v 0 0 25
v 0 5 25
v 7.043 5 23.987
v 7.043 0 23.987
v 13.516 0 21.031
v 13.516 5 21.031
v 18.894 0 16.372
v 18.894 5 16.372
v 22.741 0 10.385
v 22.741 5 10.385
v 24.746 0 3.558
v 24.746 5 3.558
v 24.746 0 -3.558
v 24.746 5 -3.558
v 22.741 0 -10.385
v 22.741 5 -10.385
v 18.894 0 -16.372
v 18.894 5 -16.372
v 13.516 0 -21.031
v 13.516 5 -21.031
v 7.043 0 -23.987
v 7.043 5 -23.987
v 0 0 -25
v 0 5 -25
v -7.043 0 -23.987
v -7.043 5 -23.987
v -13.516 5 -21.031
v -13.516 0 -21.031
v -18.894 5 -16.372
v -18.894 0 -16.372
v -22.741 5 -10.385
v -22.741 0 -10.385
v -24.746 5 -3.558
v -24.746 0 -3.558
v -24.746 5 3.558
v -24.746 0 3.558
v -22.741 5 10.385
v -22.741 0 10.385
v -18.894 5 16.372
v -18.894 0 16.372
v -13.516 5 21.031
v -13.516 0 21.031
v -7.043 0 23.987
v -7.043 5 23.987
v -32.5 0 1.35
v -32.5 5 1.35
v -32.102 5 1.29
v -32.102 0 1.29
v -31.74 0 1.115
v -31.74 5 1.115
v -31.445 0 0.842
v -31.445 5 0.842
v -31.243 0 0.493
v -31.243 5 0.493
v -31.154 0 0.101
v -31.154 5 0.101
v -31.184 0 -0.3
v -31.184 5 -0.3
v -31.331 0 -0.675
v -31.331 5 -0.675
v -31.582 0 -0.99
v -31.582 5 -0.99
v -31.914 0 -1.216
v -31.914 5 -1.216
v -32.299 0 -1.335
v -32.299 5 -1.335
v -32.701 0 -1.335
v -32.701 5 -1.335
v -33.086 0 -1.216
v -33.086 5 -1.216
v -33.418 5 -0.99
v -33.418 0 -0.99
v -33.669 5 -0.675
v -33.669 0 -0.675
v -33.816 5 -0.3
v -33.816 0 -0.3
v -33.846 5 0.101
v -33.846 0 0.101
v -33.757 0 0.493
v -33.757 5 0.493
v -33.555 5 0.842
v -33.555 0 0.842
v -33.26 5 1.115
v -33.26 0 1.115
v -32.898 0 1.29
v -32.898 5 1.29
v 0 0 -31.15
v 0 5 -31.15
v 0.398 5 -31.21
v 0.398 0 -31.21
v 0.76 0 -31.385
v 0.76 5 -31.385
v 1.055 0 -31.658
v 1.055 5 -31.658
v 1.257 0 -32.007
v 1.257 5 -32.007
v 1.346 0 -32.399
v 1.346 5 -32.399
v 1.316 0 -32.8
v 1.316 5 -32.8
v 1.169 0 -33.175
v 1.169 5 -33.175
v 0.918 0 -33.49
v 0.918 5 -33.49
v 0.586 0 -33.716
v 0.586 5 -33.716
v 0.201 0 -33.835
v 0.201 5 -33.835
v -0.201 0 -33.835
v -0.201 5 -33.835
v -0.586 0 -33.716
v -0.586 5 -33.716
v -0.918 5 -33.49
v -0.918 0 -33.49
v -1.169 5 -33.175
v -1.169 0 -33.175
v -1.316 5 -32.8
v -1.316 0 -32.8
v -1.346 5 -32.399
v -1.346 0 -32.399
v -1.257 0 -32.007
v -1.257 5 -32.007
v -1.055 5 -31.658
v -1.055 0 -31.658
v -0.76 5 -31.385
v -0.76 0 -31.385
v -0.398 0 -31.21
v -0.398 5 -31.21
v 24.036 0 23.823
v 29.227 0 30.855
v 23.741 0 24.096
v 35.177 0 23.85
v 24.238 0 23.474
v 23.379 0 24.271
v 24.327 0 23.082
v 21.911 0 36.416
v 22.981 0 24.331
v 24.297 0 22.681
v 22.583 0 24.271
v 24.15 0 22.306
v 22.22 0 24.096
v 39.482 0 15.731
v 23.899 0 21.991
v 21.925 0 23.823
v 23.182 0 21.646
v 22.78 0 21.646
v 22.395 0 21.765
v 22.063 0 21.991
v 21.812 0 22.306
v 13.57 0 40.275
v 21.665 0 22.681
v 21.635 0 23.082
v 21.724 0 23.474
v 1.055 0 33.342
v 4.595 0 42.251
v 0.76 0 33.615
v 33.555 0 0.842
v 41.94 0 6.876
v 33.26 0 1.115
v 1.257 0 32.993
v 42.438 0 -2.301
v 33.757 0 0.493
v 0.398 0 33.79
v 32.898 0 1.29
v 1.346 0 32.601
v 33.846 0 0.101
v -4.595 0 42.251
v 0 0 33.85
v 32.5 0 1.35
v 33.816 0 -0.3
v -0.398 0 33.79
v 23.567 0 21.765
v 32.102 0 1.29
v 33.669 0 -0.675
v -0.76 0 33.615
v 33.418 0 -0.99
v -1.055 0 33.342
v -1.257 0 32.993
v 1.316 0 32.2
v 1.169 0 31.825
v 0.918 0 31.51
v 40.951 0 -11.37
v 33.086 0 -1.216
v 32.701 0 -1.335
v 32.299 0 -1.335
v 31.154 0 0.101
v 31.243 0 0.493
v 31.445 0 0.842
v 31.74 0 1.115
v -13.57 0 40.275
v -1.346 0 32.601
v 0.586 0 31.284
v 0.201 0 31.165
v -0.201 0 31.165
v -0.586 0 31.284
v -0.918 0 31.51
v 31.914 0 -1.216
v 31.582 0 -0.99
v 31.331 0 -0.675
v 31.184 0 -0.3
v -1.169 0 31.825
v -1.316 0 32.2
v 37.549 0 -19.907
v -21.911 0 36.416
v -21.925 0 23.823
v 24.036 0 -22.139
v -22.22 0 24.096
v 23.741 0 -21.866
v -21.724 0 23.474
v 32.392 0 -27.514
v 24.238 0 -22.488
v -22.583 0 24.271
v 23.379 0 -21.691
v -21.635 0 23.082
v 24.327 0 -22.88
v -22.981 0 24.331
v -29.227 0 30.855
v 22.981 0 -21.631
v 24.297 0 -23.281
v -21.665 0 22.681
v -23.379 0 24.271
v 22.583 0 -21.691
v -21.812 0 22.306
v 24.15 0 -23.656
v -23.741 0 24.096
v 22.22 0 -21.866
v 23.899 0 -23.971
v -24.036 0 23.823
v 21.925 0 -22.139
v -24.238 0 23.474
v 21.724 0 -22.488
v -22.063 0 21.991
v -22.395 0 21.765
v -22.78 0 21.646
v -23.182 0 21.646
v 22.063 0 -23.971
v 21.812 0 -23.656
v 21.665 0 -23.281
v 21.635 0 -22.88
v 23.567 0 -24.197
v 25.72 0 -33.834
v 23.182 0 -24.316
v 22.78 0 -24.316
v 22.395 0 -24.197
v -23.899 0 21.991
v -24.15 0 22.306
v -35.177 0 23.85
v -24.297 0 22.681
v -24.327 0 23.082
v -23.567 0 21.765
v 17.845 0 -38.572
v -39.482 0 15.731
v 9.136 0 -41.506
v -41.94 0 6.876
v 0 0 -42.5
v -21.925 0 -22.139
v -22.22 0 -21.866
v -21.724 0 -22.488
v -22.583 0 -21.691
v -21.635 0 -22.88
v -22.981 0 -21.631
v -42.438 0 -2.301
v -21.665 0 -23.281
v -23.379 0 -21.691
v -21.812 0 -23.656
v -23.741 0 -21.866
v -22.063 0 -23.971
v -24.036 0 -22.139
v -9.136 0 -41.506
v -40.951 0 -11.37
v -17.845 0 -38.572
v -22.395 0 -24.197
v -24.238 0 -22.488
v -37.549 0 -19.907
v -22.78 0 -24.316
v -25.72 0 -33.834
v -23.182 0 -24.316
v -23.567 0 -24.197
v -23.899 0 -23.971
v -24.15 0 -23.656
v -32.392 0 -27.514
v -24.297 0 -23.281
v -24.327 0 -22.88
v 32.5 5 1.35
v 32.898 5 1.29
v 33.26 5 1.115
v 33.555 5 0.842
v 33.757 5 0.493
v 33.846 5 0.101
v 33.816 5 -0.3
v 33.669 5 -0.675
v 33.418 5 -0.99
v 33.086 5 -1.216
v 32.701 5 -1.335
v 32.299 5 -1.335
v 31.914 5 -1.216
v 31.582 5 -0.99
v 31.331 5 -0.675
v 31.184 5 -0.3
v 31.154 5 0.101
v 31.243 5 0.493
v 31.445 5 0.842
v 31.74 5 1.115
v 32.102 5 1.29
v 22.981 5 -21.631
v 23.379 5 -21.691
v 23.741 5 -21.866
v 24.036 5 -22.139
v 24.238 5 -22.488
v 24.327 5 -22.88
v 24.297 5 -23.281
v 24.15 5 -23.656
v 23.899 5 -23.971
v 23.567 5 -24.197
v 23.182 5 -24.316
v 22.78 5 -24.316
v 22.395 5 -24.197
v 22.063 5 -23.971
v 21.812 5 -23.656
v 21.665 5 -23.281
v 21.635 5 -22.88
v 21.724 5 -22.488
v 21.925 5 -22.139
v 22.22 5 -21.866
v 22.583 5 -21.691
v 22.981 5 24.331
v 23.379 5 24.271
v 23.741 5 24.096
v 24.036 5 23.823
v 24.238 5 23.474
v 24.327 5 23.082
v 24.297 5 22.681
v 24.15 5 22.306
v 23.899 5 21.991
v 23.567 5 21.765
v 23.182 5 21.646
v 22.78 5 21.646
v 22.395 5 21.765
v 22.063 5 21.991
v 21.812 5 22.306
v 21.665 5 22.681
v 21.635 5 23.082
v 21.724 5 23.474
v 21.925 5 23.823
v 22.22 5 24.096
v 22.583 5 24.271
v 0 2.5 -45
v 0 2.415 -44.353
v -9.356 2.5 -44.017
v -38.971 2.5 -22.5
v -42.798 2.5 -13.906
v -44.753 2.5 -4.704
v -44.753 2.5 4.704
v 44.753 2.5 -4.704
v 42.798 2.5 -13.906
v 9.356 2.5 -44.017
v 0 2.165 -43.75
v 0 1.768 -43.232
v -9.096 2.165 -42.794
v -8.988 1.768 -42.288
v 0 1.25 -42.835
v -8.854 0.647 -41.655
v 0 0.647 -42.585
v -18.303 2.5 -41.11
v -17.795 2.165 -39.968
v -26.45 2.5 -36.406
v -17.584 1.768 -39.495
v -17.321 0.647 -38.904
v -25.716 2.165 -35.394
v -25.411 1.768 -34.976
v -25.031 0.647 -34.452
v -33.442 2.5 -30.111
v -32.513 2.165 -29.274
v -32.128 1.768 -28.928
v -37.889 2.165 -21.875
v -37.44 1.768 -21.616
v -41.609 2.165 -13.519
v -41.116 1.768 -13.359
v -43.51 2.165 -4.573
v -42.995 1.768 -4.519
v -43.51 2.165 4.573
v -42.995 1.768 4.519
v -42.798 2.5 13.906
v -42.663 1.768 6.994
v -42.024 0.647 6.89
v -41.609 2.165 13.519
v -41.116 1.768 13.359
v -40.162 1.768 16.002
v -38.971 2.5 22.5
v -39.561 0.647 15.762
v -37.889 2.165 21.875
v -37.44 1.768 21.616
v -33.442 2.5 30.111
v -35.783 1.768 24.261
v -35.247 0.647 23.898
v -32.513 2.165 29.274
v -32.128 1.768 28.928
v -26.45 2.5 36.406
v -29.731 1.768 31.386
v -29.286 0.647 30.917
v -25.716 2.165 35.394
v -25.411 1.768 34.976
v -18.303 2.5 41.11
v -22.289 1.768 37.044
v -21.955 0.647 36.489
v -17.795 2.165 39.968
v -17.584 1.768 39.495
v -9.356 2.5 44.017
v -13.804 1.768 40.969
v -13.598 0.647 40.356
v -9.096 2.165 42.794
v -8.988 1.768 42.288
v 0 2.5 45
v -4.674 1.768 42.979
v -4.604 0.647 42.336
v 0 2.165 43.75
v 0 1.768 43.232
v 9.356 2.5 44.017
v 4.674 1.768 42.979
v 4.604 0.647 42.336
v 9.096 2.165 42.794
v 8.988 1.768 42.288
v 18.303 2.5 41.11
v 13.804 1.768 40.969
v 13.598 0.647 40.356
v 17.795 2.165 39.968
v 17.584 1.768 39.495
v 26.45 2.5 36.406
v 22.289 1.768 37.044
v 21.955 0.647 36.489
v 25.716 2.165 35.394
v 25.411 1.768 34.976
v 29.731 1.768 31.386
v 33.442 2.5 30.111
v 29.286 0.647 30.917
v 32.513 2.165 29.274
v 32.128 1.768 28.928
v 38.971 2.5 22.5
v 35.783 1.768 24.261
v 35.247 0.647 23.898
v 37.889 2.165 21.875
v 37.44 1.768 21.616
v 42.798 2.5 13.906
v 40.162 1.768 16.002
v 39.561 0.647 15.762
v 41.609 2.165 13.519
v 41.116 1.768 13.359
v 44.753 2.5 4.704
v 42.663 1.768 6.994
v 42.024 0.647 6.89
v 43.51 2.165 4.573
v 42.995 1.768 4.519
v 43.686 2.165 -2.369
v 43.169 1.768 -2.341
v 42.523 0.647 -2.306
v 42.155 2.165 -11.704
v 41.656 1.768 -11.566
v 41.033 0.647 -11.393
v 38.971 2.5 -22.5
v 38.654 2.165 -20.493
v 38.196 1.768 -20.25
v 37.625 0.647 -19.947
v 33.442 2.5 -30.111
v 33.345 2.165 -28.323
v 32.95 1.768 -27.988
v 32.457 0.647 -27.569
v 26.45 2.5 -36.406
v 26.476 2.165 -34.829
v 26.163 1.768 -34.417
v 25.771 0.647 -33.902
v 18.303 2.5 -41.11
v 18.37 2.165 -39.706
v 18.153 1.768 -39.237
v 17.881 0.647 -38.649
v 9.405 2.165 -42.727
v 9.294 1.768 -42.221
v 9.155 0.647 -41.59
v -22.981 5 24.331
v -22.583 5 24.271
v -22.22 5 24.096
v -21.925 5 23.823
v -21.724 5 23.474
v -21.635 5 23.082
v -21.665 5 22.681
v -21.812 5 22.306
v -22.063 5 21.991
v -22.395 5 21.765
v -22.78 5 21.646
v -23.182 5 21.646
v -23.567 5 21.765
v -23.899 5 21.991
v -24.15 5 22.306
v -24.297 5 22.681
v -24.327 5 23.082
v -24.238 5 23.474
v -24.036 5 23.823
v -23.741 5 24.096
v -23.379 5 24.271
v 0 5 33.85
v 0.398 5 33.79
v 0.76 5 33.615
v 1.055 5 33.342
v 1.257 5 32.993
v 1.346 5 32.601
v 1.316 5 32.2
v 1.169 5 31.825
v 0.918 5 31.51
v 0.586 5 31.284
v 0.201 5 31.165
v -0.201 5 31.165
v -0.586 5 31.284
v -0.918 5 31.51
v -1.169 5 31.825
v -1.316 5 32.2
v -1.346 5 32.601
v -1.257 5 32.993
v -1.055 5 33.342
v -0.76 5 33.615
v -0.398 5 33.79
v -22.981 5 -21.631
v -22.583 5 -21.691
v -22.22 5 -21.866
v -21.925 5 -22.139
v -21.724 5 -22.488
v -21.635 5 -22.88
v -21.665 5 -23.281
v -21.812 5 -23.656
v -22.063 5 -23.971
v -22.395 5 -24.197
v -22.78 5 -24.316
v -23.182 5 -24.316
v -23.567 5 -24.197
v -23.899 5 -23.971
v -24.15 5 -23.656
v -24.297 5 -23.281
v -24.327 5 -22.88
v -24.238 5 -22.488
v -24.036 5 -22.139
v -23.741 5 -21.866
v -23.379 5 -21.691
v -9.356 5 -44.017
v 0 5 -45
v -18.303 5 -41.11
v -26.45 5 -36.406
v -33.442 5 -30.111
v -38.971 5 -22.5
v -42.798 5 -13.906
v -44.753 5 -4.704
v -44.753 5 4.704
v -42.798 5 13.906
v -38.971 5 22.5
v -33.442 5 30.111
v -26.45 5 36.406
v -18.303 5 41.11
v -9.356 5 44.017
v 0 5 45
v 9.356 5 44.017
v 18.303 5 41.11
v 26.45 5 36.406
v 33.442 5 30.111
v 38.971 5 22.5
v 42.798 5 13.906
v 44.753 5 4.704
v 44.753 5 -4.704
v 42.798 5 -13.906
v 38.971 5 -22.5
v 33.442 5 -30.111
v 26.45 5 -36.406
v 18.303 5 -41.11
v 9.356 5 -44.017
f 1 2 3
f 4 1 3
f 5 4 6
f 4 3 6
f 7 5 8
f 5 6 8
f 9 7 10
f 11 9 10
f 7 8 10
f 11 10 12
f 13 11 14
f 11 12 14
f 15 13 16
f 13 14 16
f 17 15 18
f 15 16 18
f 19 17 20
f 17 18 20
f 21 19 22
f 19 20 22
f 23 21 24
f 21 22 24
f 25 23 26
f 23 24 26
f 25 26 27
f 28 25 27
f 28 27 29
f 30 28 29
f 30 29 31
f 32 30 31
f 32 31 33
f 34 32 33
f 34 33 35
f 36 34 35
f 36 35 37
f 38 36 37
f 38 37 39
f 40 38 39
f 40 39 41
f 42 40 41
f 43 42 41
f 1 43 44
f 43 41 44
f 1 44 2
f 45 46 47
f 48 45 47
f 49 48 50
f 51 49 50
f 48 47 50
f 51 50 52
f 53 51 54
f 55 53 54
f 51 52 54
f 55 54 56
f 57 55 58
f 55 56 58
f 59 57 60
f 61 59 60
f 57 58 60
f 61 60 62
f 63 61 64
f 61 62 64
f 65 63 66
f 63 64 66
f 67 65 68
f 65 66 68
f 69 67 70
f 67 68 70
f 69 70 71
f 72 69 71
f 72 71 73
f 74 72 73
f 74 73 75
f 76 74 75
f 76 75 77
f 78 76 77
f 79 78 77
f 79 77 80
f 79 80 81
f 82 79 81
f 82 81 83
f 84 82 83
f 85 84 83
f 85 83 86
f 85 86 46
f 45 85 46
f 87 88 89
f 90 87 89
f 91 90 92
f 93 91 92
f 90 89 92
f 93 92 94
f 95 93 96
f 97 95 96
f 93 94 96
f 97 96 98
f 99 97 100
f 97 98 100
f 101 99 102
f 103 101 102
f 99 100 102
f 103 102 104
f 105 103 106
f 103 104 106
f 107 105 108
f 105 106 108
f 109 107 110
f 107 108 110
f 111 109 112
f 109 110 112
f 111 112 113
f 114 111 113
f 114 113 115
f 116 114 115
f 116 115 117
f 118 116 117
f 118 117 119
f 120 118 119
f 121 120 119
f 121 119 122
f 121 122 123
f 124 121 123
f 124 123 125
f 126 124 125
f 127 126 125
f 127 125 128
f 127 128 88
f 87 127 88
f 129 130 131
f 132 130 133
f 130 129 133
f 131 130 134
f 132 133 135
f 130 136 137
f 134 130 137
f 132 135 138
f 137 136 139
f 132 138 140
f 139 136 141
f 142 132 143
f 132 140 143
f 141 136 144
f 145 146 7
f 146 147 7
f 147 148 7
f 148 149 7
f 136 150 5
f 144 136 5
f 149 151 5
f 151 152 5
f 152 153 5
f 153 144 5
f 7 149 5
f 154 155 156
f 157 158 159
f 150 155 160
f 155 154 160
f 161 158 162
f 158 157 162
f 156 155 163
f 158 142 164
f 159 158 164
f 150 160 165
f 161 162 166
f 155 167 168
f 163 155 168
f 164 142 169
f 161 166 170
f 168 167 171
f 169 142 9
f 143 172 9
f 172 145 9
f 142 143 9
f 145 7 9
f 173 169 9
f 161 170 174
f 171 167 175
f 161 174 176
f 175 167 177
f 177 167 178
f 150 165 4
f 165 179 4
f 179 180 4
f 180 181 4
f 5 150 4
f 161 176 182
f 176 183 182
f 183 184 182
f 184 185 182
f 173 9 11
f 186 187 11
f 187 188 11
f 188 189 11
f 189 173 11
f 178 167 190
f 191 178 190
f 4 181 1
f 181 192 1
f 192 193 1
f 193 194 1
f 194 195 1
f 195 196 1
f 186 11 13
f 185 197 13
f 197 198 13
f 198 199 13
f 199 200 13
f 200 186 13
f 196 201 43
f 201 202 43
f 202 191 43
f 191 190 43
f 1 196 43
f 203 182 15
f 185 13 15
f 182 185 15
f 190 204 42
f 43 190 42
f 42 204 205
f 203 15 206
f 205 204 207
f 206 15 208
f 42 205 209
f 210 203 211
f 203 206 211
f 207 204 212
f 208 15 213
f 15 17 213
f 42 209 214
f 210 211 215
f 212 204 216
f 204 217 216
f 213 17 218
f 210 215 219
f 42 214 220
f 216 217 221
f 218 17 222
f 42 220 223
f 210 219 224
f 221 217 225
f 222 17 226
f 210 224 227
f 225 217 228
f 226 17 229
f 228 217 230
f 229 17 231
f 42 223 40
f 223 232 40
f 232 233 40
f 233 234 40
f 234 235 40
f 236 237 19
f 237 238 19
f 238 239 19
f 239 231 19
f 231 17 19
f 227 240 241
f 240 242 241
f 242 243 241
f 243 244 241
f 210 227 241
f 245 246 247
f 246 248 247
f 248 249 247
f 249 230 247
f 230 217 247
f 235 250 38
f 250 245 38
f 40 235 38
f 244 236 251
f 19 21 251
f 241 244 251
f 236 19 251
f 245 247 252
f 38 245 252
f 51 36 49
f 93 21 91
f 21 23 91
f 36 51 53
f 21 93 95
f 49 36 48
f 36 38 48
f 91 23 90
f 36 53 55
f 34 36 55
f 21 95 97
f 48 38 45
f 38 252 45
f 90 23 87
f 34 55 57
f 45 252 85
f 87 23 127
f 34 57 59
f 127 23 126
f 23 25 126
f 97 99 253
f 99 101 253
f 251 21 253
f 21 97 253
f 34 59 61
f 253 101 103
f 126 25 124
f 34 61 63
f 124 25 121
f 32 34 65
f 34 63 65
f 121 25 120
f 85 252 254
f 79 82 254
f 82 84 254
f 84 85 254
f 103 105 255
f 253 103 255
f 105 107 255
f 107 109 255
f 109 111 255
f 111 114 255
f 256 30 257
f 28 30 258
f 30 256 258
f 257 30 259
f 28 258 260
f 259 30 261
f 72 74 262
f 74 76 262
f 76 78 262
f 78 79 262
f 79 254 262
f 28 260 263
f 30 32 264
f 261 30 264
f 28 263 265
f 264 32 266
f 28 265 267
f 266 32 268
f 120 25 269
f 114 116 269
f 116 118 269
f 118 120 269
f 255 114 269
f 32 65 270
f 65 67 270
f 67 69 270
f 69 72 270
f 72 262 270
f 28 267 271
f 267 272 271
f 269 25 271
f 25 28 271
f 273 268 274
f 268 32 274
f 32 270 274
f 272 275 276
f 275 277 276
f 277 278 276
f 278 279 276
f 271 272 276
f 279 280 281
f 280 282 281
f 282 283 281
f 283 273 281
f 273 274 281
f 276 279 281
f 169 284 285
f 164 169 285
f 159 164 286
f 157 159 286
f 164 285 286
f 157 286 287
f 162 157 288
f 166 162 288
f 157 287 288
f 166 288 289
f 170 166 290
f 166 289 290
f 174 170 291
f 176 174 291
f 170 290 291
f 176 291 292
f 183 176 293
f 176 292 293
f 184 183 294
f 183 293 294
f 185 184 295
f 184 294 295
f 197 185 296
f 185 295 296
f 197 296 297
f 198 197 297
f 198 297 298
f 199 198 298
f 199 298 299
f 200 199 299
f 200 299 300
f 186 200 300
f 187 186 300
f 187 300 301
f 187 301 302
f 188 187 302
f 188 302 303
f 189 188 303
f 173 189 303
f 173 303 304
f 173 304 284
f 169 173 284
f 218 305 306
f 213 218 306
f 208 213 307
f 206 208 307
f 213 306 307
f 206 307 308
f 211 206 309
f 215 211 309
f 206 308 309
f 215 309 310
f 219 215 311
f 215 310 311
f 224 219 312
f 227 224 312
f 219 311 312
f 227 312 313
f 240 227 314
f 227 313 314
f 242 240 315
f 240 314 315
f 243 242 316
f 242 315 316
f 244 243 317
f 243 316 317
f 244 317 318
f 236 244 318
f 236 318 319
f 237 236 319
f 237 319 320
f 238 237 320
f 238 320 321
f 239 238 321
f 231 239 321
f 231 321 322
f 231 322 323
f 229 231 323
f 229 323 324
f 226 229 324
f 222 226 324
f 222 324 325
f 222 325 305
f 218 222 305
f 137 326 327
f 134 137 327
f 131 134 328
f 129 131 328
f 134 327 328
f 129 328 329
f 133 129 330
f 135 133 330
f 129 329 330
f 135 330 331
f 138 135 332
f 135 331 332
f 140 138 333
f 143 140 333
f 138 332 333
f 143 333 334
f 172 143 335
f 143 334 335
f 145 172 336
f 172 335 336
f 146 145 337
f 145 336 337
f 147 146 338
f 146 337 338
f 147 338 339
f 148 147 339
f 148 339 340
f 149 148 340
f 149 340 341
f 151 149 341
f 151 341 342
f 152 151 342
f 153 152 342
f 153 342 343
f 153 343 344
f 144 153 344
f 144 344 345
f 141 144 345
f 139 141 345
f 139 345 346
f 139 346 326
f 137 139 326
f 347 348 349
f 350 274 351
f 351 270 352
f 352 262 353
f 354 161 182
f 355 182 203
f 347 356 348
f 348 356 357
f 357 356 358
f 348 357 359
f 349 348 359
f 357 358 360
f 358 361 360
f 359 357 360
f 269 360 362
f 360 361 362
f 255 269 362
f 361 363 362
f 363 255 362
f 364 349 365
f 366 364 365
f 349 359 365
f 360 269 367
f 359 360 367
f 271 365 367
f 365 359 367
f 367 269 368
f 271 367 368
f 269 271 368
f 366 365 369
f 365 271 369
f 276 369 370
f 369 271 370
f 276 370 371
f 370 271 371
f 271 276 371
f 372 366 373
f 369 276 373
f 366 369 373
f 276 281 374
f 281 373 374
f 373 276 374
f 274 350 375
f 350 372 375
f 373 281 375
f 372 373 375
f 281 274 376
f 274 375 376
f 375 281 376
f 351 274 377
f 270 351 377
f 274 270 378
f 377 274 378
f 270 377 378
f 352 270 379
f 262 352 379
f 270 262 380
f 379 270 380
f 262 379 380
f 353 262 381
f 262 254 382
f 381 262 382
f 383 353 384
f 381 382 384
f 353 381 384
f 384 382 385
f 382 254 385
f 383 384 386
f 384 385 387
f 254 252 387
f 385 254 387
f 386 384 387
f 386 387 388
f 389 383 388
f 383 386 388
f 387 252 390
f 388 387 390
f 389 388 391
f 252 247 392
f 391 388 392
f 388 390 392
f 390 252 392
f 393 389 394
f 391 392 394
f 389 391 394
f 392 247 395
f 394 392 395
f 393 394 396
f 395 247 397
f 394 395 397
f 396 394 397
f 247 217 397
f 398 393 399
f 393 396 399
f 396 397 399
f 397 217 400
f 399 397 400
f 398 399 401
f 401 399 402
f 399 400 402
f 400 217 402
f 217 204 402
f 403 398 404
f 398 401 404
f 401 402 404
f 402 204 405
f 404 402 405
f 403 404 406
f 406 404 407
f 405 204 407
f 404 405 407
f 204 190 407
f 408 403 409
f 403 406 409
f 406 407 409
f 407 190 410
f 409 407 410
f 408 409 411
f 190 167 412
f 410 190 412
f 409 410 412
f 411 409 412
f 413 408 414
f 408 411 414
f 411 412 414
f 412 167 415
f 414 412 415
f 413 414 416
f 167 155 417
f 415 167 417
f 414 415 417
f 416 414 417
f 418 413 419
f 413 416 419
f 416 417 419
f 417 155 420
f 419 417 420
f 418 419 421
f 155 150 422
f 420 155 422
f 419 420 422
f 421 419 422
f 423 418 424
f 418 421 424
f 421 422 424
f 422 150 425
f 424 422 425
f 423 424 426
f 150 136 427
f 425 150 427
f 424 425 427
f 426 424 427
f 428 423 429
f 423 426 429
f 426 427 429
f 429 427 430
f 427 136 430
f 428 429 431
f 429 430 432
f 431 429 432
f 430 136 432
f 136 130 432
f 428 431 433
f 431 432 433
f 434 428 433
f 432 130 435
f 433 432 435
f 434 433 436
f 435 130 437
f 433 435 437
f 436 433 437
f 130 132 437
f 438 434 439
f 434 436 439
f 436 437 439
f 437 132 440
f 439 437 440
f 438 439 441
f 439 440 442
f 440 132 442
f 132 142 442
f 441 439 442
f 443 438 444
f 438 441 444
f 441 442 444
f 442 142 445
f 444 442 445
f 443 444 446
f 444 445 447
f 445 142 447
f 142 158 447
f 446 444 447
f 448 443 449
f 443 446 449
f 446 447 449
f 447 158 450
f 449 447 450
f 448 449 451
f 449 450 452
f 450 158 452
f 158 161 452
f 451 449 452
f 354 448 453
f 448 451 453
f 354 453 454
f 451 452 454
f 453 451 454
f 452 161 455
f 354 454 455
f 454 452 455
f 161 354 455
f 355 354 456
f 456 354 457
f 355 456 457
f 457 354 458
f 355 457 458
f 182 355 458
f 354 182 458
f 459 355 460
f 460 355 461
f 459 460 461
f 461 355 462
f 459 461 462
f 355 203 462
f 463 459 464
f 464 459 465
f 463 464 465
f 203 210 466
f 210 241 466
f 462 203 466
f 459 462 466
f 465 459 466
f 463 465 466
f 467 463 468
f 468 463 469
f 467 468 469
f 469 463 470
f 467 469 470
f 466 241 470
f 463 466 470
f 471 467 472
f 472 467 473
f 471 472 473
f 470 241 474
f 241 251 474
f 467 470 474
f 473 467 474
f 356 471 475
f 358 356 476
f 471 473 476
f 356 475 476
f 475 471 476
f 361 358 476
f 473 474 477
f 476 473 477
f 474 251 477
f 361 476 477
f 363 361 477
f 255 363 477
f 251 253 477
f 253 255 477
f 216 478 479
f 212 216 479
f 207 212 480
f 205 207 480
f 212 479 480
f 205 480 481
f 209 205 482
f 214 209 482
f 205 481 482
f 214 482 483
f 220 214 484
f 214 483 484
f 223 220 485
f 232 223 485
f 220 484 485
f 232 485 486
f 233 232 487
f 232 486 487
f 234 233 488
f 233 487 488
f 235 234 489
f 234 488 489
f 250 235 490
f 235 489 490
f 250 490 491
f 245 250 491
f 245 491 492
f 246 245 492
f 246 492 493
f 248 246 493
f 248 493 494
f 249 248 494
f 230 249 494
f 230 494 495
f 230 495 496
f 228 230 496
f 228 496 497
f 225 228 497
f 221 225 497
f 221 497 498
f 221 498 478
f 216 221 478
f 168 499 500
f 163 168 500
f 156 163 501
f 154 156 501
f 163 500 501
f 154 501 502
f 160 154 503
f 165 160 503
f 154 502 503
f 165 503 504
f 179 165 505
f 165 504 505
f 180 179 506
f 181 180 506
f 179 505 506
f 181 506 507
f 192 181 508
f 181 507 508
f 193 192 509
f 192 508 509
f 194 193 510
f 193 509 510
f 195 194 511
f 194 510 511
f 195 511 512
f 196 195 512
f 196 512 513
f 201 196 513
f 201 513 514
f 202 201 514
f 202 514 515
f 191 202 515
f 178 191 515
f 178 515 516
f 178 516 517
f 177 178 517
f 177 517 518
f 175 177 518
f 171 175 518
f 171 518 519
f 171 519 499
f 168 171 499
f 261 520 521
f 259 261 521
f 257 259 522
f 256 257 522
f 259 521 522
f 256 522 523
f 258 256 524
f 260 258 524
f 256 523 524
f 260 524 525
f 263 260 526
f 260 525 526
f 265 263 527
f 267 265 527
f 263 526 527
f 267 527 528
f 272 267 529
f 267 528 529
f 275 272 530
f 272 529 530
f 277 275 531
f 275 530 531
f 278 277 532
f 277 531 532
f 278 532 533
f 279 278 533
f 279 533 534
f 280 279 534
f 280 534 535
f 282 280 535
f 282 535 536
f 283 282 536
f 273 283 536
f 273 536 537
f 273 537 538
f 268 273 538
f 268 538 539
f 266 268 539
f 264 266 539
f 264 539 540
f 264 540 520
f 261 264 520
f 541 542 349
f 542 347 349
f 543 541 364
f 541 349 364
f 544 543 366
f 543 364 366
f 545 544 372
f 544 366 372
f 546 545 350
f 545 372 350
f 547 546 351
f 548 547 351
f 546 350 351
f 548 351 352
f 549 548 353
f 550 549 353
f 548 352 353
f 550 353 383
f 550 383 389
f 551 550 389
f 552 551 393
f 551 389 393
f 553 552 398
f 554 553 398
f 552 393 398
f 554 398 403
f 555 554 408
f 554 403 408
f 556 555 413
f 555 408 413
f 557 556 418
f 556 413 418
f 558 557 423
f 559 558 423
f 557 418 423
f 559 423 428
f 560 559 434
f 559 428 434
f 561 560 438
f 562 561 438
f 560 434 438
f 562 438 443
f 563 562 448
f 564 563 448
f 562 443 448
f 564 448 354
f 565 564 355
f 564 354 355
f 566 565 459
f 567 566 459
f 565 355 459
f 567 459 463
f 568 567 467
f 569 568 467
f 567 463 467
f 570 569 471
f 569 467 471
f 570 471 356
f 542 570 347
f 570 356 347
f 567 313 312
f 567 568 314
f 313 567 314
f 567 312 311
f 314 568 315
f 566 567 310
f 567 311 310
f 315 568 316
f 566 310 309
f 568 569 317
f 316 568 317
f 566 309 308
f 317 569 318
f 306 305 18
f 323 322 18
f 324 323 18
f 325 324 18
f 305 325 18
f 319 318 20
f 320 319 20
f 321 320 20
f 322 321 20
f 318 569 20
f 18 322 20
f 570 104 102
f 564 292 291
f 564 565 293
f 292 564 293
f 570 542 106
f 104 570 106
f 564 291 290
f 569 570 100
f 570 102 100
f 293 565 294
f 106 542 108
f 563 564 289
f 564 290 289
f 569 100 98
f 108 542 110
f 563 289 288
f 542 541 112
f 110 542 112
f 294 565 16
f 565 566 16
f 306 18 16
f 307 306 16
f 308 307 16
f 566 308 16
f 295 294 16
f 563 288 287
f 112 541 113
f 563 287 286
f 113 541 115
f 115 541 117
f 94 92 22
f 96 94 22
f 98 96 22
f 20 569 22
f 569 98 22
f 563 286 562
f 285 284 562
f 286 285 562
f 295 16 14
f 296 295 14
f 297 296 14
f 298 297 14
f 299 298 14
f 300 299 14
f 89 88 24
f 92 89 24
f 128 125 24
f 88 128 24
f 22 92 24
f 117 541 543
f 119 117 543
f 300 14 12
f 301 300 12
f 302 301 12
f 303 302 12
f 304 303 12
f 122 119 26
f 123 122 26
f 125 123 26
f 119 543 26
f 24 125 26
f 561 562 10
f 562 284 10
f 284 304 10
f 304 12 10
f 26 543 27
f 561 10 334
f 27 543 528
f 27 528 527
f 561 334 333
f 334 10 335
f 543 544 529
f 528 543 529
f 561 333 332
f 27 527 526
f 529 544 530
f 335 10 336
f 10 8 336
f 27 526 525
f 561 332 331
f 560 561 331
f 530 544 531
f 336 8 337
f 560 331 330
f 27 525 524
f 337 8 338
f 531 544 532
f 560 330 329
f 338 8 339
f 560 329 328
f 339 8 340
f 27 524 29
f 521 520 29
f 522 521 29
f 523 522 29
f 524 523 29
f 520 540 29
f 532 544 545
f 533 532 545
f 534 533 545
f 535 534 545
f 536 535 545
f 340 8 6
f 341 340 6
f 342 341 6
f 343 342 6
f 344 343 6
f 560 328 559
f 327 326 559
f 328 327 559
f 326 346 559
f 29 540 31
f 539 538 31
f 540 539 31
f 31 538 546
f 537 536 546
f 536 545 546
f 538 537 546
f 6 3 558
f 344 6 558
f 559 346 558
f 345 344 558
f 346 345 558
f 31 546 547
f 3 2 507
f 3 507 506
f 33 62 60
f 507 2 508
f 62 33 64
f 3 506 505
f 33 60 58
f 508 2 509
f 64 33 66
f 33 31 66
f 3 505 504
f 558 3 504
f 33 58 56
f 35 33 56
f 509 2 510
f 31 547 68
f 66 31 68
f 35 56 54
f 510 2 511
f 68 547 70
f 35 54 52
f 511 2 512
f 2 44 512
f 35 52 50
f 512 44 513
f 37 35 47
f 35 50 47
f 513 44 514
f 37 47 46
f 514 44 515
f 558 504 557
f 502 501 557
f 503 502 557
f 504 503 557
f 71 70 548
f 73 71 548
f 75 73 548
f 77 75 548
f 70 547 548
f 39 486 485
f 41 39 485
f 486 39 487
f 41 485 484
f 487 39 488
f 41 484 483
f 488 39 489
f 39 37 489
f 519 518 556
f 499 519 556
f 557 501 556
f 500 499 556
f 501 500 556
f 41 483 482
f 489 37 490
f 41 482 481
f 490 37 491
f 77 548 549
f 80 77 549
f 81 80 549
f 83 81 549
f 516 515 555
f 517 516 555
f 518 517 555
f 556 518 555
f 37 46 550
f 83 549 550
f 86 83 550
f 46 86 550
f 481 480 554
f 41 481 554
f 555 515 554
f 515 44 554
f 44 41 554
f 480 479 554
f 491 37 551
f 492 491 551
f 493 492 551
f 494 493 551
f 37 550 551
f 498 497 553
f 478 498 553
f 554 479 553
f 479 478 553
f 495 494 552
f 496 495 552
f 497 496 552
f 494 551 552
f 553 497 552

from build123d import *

# Parameters (mm, degrees)
SKETCH2_R          = 1.35
CUT_EXTRUDE1_DEPTH = 64.835726674
SKETCH4_R          = 25
CUT_EXTRUDE2_DEPTH = 64.835726674


with BuildPart() as part:
    # Sketch1 → Revolve1 (revolve)
    with BuildSketch(Plane.XY, mode=Mode.PRIVATE) as revolve1_sk:
        with BuildLine():
            Line((-42.5, 0), (0, 0))
            Line((0, 0), (0, 5))
            Line((0, 5), (-45, 5))
            Line((-45, 5), (-45, 2.5))
            ThreePointArc((-45, 2.5), (-43.232233047, 1.767766953), (-42.5, 0))
        make_face()
    revolve(revolve1_sk.sketch.rotate(Axis((0, 0, 0), (0, 1, 0)), 270), axis=Axis((0, 0, 0), (0, 1, 0)))

    # Sketch2 → Cut-Extrude1 (cut, through all)
    with BuildSketch(Plane(origin=(0, 5, 0), x_dir=(1, 0, 0), z_dir=(0, 1, 0))):
        with Locations(Location((0, 32.5, 0), (0, 0, 270))):
            Circle(SKETCH2_R)
        with Locations(Location((22.980970389, 22.980970389, 0), (0, 0, 270))):
            Circle(SKETCH2_R)
        with Locations(Location((32.5, 0, 0), (0, 0, 270))):
            Circle(SKETCH2_R)
        with Locations(Location((22.980970389, -22.980970389, 0), (0, 0, 270))):
            Circle(SKETCH2_R)
        with Locations(Location((0, -32.5, 0), (0, 0, 270))):
            Circle(SKETCH2_R)
        with Locations(Location((-22.980970389, -22.980970389, 0), (0, 0, 270))):
            Circle(SKETCH2_R)
        with Locations(Location((-32.5, 0, 0), (0, 0, 270))):
            Circle(SKETCH2_R)
        with Locations(Location((-22.980970389, 22.980970389, 0), (0, 0, 270))):
            Circle(SKETCH2_R)
    extrude(amount=-CUT_EXTRUDE1_DEPTH, mode=Mode.SUBTRACT)

    # Sketch4 → Cut-Extrude2 (cut, through all)
    with BuildSketch(Plane(origin=(0, 5, 0), x_dir=(1, 0, 0), z_dir=(0, 1, 0))):
        with Locations(Location((0, 0, 0), (0, 0, 270))):
            Circle(SKETCH4_R)
    extrude(amount=-CUT_EXTRUDE2_DEPTH, mode=Mode.SUBTRACT)


solid = part.part
